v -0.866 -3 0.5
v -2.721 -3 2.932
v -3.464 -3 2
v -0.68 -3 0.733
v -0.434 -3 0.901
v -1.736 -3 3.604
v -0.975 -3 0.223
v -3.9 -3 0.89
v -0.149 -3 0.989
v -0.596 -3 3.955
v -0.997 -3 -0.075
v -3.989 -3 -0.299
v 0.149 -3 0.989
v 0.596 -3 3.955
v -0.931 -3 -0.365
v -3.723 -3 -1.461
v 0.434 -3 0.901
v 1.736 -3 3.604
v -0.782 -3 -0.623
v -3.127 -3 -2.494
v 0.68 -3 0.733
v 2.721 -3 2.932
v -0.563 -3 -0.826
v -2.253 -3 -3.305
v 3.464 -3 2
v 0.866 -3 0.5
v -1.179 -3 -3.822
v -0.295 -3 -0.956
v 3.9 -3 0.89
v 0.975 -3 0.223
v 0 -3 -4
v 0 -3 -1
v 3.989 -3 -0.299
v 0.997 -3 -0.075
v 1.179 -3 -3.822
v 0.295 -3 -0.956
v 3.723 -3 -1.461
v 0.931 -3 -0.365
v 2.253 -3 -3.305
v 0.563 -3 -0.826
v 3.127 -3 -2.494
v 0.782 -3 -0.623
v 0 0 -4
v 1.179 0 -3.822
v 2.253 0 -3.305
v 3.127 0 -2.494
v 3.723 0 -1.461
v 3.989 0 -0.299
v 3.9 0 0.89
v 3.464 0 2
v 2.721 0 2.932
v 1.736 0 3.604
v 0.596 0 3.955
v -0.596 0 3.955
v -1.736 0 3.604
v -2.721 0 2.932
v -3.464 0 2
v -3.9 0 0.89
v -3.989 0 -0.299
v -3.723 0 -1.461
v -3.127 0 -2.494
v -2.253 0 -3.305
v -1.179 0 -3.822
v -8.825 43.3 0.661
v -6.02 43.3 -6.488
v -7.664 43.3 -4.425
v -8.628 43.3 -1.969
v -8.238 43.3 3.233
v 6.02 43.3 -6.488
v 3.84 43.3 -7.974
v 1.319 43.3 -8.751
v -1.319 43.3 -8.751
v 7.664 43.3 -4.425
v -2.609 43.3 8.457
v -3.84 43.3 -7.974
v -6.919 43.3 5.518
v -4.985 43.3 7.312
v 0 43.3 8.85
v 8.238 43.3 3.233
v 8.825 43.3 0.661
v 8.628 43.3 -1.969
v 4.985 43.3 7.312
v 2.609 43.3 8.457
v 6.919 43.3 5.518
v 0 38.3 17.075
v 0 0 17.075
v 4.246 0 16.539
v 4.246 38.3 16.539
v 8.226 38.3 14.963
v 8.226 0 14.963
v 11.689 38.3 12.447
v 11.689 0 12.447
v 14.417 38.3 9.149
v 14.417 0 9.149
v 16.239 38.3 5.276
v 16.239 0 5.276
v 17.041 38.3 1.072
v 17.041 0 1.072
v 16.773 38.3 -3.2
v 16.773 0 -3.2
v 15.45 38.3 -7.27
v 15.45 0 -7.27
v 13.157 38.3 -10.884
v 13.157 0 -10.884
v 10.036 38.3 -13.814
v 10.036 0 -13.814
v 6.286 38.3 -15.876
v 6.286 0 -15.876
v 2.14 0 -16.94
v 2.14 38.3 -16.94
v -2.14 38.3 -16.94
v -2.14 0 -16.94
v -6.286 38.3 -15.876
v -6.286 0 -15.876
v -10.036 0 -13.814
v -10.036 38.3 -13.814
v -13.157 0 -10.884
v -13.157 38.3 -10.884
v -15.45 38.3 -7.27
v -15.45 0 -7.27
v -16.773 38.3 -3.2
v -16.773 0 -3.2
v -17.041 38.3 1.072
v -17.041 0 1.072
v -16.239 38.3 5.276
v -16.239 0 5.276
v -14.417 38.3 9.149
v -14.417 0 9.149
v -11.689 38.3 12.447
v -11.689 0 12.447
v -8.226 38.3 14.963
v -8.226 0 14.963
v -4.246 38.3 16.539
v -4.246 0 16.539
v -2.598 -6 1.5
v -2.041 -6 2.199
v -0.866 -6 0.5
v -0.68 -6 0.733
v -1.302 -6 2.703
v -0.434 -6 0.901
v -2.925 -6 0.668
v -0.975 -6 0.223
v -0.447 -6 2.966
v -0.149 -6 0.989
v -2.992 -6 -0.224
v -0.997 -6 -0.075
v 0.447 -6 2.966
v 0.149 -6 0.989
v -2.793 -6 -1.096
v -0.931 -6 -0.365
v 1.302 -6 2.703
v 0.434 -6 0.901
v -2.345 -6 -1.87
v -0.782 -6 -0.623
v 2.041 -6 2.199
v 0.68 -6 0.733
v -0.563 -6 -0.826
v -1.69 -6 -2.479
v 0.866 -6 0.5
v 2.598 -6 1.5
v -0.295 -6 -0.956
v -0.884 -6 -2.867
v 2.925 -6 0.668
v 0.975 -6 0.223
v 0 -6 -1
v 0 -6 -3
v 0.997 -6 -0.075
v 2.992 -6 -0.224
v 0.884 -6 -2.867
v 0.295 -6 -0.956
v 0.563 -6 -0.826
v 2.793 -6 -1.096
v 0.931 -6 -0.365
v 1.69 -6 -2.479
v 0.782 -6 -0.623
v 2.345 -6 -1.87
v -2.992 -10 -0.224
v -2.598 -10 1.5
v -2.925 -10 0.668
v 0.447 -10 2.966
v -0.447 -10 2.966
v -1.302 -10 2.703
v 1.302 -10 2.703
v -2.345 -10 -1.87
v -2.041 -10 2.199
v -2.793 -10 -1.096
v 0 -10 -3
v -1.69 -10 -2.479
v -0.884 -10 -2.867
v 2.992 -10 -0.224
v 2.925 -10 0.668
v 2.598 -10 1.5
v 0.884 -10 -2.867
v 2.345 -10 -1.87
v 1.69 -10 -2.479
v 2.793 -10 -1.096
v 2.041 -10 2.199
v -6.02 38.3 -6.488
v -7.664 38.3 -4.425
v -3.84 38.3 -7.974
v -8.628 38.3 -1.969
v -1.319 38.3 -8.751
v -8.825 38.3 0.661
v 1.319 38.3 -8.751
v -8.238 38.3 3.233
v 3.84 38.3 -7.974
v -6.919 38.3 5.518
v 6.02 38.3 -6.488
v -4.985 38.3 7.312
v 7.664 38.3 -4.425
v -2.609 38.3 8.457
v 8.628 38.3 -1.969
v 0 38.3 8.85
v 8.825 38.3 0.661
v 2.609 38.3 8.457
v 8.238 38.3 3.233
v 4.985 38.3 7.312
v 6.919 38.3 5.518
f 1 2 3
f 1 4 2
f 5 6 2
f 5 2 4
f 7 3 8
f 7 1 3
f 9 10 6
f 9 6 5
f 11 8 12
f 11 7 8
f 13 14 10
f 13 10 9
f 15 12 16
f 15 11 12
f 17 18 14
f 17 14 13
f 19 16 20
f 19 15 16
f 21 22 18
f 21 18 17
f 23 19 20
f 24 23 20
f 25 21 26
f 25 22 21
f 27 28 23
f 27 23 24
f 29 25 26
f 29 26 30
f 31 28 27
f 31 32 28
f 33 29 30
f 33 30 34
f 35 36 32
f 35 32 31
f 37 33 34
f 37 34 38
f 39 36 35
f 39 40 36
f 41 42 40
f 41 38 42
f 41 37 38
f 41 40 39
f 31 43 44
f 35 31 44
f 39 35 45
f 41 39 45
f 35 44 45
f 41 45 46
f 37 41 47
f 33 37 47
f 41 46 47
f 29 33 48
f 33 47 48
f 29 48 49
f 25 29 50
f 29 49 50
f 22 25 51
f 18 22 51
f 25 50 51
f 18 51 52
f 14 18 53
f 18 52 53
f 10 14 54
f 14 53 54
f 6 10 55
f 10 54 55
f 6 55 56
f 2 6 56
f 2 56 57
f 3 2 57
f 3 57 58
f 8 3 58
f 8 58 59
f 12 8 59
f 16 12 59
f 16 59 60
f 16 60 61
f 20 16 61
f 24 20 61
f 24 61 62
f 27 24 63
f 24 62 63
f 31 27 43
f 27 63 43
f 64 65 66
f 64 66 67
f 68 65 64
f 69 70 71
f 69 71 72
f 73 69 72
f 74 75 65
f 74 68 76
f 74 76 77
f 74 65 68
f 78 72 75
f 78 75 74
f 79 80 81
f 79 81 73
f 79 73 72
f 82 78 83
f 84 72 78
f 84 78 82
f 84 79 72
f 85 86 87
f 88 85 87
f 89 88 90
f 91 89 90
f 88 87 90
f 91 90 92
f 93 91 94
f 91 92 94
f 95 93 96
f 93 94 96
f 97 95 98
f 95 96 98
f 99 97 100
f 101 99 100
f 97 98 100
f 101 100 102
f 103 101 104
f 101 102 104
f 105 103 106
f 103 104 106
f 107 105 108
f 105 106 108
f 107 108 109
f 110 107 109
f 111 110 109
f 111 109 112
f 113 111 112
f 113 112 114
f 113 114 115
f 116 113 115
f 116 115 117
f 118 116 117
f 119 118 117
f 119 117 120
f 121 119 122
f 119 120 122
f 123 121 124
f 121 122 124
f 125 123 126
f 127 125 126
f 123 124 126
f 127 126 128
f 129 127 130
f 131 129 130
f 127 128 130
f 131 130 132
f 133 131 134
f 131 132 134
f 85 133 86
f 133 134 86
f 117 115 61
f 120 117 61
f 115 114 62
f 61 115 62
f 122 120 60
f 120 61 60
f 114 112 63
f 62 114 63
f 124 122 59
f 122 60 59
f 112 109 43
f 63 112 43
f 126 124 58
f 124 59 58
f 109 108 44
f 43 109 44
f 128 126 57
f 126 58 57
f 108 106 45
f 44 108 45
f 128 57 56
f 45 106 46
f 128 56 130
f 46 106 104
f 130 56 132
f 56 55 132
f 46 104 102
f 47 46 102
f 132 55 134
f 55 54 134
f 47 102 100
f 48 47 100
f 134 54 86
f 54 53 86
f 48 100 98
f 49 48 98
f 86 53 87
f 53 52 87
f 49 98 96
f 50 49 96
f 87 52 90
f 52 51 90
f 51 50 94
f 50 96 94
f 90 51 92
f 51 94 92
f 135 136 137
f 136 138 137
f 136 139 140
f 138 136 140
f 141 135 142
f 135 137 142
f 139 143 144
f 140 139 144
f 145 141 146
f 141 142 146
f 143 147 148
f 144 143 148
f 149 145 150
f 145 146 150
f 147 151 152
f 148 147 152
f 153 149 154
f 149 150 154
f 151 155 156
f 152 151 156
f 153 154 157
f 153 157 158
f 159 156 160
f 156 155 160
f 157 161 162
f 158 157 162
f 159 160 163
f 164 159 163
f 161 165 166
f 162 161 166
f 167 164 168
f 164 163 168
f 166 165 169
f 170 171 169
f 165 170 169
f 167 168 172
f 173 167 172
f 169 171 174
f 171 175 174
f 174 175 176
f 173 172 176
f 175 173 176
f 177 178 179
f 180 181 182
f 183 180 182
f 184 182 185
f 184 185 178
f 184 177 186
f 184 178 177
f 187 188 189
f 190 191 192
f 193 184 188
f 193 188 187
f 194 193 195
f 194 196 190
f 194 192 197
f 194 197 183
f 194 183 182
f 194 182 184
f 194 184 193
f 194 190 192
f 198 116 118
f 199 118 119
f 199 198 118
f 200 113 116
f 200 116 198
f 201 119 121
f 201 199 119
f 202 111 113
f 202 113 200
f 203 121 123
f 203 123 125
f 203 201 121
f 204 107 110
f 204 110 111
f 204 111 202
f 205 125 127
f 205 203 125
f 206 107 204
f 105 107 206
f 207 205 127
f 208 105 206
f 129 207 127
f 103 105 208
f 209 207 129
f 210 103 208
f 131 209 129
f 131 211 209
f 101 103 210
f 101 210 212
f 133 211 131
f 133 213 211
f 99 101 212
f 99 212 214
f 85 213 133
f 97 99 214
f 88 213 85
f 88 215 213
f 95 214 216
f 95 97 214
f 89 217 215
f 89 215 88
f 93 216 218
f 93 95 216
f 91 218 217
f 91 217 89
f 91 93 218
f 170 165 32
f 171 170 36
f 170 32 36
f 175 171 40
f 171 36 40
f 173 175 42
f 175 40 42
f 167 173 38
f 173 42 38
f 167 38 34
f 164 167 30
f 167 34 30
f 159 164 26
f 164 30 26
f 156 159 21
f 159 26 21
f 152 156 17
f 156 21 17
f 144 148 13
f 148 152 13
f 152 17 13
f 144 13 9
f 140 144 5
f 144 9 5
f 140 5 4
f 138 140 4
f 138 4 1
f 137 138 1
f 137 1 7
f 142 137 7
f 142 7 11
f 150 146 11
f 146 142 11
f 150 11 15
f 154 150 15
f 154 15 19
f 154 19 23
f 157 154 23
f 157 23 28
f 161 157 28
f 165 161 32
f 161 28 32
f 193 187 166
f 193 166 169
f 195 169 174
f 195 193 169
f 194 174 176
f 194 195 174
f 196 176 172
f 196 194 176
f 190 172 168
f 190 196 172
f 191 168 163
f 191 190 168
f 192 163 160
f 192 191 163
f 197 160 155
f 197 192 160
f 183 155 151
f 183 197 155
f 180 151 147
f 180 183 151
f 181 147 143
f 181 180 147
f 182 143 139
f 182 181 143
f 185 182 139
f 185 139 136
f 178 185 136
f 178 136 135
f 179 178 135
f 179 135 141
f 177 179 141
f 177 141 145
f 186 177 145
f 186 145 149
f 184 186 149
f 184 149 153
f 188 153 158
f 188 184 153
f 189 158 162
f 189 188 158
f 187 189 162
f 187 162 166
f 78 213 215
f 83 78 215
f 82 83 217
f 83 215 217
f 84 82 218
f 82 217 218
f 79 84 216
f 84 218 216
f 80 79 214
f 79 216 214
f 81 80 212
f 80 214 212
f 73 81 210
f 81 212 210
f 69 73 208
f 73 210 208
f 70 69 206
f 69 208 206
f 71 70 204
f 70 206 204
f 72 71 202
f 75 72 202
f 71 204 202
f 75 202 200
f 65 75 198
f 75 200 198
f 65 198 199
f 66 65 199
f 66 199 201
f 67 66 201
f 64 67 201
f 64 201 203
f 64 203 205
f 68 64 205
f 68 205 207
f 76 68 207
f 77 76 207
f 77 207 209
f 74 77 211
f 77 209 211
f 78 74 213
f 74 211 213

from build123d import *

# Parameters (mm, degrees)
ESBO_O1_R                = 17.075
RESSALTO_EXTRUS_O1_DEPTH = 38.3
ESBO_O2_R                = 8.85
RESSALTO_EXTRUS_O2_DEPTH = 5
ESBO_O3_R                = 4
RESSALTO_EXTRUS_O3_DEPTH = 3
ESBO_O5_R                = 1
RESSALTO_EXTRUS_O4_DEPTH = 7
ESBO_O6_R                = 3
RESSALTO_EXTRUS_O5_DEPTH = 4


with BuildPart() as part:
    # Esboço1 → Ressalto-extrusão1 (new body)
    with BuildSketch(Plane(origin=(0, 0, 0), x_dir=(1, 0, 0), z_dir=(0, 1, 0))):
        with Locations(Location((0, 0, 0), (0, 0, 270))):
            Circle(ESBO_O1_R)
    extrude(amount=RESSALTO_EXTRUS_O1_DEPTH)

    # Esboço2 → Ressalto-extrusão2 (add)
    with BuildSketch(Plane(origin=(0, 38.3, 0), x_dir=(1, 0, 0), z_dir=(0, 1, 0))):
        with Locations(Location((0, 0, 0), (0, 0, 270))):
            Circle(ESBO_O2_R)
    extrude(amount=RESSALTO_EXTRUS_O2_DEPTH)

    # Esboço3 → Ressalto-extrusão3 (add)
    with BuildSketch(Plane.XZ):
        with Locations(Location((0, 0, 0), (0, 0, 270))):
            Circle(ESBO_O3_R)
    extrude(amount=RESSALTO_EXTRUS_O3_DEPTH)

    # Esboço5 → Ressalto-extrusão4 (add)
    with BuildSketch(Plane.XZ.offset(3)):
        with Locations(Location((0, 0, 0), (0, 0, 270))):
            Circle(ESBO_O5_R)
    extrude(amount=RESSALTO_EXTRUS_O4_DEPTH)

    # Esboço6 → Ressalto-extrusão5 (add)
    with BuildSketch(Plane.XZ.offset(10)):
        with Locations(Location((0, 0, 0), (0, 0, 270))):
            Circle(ESBO_O6_R)
    extrude(amount=-RESSALTO_EXTRUS_O5_DEPTH)


solid = part.part
